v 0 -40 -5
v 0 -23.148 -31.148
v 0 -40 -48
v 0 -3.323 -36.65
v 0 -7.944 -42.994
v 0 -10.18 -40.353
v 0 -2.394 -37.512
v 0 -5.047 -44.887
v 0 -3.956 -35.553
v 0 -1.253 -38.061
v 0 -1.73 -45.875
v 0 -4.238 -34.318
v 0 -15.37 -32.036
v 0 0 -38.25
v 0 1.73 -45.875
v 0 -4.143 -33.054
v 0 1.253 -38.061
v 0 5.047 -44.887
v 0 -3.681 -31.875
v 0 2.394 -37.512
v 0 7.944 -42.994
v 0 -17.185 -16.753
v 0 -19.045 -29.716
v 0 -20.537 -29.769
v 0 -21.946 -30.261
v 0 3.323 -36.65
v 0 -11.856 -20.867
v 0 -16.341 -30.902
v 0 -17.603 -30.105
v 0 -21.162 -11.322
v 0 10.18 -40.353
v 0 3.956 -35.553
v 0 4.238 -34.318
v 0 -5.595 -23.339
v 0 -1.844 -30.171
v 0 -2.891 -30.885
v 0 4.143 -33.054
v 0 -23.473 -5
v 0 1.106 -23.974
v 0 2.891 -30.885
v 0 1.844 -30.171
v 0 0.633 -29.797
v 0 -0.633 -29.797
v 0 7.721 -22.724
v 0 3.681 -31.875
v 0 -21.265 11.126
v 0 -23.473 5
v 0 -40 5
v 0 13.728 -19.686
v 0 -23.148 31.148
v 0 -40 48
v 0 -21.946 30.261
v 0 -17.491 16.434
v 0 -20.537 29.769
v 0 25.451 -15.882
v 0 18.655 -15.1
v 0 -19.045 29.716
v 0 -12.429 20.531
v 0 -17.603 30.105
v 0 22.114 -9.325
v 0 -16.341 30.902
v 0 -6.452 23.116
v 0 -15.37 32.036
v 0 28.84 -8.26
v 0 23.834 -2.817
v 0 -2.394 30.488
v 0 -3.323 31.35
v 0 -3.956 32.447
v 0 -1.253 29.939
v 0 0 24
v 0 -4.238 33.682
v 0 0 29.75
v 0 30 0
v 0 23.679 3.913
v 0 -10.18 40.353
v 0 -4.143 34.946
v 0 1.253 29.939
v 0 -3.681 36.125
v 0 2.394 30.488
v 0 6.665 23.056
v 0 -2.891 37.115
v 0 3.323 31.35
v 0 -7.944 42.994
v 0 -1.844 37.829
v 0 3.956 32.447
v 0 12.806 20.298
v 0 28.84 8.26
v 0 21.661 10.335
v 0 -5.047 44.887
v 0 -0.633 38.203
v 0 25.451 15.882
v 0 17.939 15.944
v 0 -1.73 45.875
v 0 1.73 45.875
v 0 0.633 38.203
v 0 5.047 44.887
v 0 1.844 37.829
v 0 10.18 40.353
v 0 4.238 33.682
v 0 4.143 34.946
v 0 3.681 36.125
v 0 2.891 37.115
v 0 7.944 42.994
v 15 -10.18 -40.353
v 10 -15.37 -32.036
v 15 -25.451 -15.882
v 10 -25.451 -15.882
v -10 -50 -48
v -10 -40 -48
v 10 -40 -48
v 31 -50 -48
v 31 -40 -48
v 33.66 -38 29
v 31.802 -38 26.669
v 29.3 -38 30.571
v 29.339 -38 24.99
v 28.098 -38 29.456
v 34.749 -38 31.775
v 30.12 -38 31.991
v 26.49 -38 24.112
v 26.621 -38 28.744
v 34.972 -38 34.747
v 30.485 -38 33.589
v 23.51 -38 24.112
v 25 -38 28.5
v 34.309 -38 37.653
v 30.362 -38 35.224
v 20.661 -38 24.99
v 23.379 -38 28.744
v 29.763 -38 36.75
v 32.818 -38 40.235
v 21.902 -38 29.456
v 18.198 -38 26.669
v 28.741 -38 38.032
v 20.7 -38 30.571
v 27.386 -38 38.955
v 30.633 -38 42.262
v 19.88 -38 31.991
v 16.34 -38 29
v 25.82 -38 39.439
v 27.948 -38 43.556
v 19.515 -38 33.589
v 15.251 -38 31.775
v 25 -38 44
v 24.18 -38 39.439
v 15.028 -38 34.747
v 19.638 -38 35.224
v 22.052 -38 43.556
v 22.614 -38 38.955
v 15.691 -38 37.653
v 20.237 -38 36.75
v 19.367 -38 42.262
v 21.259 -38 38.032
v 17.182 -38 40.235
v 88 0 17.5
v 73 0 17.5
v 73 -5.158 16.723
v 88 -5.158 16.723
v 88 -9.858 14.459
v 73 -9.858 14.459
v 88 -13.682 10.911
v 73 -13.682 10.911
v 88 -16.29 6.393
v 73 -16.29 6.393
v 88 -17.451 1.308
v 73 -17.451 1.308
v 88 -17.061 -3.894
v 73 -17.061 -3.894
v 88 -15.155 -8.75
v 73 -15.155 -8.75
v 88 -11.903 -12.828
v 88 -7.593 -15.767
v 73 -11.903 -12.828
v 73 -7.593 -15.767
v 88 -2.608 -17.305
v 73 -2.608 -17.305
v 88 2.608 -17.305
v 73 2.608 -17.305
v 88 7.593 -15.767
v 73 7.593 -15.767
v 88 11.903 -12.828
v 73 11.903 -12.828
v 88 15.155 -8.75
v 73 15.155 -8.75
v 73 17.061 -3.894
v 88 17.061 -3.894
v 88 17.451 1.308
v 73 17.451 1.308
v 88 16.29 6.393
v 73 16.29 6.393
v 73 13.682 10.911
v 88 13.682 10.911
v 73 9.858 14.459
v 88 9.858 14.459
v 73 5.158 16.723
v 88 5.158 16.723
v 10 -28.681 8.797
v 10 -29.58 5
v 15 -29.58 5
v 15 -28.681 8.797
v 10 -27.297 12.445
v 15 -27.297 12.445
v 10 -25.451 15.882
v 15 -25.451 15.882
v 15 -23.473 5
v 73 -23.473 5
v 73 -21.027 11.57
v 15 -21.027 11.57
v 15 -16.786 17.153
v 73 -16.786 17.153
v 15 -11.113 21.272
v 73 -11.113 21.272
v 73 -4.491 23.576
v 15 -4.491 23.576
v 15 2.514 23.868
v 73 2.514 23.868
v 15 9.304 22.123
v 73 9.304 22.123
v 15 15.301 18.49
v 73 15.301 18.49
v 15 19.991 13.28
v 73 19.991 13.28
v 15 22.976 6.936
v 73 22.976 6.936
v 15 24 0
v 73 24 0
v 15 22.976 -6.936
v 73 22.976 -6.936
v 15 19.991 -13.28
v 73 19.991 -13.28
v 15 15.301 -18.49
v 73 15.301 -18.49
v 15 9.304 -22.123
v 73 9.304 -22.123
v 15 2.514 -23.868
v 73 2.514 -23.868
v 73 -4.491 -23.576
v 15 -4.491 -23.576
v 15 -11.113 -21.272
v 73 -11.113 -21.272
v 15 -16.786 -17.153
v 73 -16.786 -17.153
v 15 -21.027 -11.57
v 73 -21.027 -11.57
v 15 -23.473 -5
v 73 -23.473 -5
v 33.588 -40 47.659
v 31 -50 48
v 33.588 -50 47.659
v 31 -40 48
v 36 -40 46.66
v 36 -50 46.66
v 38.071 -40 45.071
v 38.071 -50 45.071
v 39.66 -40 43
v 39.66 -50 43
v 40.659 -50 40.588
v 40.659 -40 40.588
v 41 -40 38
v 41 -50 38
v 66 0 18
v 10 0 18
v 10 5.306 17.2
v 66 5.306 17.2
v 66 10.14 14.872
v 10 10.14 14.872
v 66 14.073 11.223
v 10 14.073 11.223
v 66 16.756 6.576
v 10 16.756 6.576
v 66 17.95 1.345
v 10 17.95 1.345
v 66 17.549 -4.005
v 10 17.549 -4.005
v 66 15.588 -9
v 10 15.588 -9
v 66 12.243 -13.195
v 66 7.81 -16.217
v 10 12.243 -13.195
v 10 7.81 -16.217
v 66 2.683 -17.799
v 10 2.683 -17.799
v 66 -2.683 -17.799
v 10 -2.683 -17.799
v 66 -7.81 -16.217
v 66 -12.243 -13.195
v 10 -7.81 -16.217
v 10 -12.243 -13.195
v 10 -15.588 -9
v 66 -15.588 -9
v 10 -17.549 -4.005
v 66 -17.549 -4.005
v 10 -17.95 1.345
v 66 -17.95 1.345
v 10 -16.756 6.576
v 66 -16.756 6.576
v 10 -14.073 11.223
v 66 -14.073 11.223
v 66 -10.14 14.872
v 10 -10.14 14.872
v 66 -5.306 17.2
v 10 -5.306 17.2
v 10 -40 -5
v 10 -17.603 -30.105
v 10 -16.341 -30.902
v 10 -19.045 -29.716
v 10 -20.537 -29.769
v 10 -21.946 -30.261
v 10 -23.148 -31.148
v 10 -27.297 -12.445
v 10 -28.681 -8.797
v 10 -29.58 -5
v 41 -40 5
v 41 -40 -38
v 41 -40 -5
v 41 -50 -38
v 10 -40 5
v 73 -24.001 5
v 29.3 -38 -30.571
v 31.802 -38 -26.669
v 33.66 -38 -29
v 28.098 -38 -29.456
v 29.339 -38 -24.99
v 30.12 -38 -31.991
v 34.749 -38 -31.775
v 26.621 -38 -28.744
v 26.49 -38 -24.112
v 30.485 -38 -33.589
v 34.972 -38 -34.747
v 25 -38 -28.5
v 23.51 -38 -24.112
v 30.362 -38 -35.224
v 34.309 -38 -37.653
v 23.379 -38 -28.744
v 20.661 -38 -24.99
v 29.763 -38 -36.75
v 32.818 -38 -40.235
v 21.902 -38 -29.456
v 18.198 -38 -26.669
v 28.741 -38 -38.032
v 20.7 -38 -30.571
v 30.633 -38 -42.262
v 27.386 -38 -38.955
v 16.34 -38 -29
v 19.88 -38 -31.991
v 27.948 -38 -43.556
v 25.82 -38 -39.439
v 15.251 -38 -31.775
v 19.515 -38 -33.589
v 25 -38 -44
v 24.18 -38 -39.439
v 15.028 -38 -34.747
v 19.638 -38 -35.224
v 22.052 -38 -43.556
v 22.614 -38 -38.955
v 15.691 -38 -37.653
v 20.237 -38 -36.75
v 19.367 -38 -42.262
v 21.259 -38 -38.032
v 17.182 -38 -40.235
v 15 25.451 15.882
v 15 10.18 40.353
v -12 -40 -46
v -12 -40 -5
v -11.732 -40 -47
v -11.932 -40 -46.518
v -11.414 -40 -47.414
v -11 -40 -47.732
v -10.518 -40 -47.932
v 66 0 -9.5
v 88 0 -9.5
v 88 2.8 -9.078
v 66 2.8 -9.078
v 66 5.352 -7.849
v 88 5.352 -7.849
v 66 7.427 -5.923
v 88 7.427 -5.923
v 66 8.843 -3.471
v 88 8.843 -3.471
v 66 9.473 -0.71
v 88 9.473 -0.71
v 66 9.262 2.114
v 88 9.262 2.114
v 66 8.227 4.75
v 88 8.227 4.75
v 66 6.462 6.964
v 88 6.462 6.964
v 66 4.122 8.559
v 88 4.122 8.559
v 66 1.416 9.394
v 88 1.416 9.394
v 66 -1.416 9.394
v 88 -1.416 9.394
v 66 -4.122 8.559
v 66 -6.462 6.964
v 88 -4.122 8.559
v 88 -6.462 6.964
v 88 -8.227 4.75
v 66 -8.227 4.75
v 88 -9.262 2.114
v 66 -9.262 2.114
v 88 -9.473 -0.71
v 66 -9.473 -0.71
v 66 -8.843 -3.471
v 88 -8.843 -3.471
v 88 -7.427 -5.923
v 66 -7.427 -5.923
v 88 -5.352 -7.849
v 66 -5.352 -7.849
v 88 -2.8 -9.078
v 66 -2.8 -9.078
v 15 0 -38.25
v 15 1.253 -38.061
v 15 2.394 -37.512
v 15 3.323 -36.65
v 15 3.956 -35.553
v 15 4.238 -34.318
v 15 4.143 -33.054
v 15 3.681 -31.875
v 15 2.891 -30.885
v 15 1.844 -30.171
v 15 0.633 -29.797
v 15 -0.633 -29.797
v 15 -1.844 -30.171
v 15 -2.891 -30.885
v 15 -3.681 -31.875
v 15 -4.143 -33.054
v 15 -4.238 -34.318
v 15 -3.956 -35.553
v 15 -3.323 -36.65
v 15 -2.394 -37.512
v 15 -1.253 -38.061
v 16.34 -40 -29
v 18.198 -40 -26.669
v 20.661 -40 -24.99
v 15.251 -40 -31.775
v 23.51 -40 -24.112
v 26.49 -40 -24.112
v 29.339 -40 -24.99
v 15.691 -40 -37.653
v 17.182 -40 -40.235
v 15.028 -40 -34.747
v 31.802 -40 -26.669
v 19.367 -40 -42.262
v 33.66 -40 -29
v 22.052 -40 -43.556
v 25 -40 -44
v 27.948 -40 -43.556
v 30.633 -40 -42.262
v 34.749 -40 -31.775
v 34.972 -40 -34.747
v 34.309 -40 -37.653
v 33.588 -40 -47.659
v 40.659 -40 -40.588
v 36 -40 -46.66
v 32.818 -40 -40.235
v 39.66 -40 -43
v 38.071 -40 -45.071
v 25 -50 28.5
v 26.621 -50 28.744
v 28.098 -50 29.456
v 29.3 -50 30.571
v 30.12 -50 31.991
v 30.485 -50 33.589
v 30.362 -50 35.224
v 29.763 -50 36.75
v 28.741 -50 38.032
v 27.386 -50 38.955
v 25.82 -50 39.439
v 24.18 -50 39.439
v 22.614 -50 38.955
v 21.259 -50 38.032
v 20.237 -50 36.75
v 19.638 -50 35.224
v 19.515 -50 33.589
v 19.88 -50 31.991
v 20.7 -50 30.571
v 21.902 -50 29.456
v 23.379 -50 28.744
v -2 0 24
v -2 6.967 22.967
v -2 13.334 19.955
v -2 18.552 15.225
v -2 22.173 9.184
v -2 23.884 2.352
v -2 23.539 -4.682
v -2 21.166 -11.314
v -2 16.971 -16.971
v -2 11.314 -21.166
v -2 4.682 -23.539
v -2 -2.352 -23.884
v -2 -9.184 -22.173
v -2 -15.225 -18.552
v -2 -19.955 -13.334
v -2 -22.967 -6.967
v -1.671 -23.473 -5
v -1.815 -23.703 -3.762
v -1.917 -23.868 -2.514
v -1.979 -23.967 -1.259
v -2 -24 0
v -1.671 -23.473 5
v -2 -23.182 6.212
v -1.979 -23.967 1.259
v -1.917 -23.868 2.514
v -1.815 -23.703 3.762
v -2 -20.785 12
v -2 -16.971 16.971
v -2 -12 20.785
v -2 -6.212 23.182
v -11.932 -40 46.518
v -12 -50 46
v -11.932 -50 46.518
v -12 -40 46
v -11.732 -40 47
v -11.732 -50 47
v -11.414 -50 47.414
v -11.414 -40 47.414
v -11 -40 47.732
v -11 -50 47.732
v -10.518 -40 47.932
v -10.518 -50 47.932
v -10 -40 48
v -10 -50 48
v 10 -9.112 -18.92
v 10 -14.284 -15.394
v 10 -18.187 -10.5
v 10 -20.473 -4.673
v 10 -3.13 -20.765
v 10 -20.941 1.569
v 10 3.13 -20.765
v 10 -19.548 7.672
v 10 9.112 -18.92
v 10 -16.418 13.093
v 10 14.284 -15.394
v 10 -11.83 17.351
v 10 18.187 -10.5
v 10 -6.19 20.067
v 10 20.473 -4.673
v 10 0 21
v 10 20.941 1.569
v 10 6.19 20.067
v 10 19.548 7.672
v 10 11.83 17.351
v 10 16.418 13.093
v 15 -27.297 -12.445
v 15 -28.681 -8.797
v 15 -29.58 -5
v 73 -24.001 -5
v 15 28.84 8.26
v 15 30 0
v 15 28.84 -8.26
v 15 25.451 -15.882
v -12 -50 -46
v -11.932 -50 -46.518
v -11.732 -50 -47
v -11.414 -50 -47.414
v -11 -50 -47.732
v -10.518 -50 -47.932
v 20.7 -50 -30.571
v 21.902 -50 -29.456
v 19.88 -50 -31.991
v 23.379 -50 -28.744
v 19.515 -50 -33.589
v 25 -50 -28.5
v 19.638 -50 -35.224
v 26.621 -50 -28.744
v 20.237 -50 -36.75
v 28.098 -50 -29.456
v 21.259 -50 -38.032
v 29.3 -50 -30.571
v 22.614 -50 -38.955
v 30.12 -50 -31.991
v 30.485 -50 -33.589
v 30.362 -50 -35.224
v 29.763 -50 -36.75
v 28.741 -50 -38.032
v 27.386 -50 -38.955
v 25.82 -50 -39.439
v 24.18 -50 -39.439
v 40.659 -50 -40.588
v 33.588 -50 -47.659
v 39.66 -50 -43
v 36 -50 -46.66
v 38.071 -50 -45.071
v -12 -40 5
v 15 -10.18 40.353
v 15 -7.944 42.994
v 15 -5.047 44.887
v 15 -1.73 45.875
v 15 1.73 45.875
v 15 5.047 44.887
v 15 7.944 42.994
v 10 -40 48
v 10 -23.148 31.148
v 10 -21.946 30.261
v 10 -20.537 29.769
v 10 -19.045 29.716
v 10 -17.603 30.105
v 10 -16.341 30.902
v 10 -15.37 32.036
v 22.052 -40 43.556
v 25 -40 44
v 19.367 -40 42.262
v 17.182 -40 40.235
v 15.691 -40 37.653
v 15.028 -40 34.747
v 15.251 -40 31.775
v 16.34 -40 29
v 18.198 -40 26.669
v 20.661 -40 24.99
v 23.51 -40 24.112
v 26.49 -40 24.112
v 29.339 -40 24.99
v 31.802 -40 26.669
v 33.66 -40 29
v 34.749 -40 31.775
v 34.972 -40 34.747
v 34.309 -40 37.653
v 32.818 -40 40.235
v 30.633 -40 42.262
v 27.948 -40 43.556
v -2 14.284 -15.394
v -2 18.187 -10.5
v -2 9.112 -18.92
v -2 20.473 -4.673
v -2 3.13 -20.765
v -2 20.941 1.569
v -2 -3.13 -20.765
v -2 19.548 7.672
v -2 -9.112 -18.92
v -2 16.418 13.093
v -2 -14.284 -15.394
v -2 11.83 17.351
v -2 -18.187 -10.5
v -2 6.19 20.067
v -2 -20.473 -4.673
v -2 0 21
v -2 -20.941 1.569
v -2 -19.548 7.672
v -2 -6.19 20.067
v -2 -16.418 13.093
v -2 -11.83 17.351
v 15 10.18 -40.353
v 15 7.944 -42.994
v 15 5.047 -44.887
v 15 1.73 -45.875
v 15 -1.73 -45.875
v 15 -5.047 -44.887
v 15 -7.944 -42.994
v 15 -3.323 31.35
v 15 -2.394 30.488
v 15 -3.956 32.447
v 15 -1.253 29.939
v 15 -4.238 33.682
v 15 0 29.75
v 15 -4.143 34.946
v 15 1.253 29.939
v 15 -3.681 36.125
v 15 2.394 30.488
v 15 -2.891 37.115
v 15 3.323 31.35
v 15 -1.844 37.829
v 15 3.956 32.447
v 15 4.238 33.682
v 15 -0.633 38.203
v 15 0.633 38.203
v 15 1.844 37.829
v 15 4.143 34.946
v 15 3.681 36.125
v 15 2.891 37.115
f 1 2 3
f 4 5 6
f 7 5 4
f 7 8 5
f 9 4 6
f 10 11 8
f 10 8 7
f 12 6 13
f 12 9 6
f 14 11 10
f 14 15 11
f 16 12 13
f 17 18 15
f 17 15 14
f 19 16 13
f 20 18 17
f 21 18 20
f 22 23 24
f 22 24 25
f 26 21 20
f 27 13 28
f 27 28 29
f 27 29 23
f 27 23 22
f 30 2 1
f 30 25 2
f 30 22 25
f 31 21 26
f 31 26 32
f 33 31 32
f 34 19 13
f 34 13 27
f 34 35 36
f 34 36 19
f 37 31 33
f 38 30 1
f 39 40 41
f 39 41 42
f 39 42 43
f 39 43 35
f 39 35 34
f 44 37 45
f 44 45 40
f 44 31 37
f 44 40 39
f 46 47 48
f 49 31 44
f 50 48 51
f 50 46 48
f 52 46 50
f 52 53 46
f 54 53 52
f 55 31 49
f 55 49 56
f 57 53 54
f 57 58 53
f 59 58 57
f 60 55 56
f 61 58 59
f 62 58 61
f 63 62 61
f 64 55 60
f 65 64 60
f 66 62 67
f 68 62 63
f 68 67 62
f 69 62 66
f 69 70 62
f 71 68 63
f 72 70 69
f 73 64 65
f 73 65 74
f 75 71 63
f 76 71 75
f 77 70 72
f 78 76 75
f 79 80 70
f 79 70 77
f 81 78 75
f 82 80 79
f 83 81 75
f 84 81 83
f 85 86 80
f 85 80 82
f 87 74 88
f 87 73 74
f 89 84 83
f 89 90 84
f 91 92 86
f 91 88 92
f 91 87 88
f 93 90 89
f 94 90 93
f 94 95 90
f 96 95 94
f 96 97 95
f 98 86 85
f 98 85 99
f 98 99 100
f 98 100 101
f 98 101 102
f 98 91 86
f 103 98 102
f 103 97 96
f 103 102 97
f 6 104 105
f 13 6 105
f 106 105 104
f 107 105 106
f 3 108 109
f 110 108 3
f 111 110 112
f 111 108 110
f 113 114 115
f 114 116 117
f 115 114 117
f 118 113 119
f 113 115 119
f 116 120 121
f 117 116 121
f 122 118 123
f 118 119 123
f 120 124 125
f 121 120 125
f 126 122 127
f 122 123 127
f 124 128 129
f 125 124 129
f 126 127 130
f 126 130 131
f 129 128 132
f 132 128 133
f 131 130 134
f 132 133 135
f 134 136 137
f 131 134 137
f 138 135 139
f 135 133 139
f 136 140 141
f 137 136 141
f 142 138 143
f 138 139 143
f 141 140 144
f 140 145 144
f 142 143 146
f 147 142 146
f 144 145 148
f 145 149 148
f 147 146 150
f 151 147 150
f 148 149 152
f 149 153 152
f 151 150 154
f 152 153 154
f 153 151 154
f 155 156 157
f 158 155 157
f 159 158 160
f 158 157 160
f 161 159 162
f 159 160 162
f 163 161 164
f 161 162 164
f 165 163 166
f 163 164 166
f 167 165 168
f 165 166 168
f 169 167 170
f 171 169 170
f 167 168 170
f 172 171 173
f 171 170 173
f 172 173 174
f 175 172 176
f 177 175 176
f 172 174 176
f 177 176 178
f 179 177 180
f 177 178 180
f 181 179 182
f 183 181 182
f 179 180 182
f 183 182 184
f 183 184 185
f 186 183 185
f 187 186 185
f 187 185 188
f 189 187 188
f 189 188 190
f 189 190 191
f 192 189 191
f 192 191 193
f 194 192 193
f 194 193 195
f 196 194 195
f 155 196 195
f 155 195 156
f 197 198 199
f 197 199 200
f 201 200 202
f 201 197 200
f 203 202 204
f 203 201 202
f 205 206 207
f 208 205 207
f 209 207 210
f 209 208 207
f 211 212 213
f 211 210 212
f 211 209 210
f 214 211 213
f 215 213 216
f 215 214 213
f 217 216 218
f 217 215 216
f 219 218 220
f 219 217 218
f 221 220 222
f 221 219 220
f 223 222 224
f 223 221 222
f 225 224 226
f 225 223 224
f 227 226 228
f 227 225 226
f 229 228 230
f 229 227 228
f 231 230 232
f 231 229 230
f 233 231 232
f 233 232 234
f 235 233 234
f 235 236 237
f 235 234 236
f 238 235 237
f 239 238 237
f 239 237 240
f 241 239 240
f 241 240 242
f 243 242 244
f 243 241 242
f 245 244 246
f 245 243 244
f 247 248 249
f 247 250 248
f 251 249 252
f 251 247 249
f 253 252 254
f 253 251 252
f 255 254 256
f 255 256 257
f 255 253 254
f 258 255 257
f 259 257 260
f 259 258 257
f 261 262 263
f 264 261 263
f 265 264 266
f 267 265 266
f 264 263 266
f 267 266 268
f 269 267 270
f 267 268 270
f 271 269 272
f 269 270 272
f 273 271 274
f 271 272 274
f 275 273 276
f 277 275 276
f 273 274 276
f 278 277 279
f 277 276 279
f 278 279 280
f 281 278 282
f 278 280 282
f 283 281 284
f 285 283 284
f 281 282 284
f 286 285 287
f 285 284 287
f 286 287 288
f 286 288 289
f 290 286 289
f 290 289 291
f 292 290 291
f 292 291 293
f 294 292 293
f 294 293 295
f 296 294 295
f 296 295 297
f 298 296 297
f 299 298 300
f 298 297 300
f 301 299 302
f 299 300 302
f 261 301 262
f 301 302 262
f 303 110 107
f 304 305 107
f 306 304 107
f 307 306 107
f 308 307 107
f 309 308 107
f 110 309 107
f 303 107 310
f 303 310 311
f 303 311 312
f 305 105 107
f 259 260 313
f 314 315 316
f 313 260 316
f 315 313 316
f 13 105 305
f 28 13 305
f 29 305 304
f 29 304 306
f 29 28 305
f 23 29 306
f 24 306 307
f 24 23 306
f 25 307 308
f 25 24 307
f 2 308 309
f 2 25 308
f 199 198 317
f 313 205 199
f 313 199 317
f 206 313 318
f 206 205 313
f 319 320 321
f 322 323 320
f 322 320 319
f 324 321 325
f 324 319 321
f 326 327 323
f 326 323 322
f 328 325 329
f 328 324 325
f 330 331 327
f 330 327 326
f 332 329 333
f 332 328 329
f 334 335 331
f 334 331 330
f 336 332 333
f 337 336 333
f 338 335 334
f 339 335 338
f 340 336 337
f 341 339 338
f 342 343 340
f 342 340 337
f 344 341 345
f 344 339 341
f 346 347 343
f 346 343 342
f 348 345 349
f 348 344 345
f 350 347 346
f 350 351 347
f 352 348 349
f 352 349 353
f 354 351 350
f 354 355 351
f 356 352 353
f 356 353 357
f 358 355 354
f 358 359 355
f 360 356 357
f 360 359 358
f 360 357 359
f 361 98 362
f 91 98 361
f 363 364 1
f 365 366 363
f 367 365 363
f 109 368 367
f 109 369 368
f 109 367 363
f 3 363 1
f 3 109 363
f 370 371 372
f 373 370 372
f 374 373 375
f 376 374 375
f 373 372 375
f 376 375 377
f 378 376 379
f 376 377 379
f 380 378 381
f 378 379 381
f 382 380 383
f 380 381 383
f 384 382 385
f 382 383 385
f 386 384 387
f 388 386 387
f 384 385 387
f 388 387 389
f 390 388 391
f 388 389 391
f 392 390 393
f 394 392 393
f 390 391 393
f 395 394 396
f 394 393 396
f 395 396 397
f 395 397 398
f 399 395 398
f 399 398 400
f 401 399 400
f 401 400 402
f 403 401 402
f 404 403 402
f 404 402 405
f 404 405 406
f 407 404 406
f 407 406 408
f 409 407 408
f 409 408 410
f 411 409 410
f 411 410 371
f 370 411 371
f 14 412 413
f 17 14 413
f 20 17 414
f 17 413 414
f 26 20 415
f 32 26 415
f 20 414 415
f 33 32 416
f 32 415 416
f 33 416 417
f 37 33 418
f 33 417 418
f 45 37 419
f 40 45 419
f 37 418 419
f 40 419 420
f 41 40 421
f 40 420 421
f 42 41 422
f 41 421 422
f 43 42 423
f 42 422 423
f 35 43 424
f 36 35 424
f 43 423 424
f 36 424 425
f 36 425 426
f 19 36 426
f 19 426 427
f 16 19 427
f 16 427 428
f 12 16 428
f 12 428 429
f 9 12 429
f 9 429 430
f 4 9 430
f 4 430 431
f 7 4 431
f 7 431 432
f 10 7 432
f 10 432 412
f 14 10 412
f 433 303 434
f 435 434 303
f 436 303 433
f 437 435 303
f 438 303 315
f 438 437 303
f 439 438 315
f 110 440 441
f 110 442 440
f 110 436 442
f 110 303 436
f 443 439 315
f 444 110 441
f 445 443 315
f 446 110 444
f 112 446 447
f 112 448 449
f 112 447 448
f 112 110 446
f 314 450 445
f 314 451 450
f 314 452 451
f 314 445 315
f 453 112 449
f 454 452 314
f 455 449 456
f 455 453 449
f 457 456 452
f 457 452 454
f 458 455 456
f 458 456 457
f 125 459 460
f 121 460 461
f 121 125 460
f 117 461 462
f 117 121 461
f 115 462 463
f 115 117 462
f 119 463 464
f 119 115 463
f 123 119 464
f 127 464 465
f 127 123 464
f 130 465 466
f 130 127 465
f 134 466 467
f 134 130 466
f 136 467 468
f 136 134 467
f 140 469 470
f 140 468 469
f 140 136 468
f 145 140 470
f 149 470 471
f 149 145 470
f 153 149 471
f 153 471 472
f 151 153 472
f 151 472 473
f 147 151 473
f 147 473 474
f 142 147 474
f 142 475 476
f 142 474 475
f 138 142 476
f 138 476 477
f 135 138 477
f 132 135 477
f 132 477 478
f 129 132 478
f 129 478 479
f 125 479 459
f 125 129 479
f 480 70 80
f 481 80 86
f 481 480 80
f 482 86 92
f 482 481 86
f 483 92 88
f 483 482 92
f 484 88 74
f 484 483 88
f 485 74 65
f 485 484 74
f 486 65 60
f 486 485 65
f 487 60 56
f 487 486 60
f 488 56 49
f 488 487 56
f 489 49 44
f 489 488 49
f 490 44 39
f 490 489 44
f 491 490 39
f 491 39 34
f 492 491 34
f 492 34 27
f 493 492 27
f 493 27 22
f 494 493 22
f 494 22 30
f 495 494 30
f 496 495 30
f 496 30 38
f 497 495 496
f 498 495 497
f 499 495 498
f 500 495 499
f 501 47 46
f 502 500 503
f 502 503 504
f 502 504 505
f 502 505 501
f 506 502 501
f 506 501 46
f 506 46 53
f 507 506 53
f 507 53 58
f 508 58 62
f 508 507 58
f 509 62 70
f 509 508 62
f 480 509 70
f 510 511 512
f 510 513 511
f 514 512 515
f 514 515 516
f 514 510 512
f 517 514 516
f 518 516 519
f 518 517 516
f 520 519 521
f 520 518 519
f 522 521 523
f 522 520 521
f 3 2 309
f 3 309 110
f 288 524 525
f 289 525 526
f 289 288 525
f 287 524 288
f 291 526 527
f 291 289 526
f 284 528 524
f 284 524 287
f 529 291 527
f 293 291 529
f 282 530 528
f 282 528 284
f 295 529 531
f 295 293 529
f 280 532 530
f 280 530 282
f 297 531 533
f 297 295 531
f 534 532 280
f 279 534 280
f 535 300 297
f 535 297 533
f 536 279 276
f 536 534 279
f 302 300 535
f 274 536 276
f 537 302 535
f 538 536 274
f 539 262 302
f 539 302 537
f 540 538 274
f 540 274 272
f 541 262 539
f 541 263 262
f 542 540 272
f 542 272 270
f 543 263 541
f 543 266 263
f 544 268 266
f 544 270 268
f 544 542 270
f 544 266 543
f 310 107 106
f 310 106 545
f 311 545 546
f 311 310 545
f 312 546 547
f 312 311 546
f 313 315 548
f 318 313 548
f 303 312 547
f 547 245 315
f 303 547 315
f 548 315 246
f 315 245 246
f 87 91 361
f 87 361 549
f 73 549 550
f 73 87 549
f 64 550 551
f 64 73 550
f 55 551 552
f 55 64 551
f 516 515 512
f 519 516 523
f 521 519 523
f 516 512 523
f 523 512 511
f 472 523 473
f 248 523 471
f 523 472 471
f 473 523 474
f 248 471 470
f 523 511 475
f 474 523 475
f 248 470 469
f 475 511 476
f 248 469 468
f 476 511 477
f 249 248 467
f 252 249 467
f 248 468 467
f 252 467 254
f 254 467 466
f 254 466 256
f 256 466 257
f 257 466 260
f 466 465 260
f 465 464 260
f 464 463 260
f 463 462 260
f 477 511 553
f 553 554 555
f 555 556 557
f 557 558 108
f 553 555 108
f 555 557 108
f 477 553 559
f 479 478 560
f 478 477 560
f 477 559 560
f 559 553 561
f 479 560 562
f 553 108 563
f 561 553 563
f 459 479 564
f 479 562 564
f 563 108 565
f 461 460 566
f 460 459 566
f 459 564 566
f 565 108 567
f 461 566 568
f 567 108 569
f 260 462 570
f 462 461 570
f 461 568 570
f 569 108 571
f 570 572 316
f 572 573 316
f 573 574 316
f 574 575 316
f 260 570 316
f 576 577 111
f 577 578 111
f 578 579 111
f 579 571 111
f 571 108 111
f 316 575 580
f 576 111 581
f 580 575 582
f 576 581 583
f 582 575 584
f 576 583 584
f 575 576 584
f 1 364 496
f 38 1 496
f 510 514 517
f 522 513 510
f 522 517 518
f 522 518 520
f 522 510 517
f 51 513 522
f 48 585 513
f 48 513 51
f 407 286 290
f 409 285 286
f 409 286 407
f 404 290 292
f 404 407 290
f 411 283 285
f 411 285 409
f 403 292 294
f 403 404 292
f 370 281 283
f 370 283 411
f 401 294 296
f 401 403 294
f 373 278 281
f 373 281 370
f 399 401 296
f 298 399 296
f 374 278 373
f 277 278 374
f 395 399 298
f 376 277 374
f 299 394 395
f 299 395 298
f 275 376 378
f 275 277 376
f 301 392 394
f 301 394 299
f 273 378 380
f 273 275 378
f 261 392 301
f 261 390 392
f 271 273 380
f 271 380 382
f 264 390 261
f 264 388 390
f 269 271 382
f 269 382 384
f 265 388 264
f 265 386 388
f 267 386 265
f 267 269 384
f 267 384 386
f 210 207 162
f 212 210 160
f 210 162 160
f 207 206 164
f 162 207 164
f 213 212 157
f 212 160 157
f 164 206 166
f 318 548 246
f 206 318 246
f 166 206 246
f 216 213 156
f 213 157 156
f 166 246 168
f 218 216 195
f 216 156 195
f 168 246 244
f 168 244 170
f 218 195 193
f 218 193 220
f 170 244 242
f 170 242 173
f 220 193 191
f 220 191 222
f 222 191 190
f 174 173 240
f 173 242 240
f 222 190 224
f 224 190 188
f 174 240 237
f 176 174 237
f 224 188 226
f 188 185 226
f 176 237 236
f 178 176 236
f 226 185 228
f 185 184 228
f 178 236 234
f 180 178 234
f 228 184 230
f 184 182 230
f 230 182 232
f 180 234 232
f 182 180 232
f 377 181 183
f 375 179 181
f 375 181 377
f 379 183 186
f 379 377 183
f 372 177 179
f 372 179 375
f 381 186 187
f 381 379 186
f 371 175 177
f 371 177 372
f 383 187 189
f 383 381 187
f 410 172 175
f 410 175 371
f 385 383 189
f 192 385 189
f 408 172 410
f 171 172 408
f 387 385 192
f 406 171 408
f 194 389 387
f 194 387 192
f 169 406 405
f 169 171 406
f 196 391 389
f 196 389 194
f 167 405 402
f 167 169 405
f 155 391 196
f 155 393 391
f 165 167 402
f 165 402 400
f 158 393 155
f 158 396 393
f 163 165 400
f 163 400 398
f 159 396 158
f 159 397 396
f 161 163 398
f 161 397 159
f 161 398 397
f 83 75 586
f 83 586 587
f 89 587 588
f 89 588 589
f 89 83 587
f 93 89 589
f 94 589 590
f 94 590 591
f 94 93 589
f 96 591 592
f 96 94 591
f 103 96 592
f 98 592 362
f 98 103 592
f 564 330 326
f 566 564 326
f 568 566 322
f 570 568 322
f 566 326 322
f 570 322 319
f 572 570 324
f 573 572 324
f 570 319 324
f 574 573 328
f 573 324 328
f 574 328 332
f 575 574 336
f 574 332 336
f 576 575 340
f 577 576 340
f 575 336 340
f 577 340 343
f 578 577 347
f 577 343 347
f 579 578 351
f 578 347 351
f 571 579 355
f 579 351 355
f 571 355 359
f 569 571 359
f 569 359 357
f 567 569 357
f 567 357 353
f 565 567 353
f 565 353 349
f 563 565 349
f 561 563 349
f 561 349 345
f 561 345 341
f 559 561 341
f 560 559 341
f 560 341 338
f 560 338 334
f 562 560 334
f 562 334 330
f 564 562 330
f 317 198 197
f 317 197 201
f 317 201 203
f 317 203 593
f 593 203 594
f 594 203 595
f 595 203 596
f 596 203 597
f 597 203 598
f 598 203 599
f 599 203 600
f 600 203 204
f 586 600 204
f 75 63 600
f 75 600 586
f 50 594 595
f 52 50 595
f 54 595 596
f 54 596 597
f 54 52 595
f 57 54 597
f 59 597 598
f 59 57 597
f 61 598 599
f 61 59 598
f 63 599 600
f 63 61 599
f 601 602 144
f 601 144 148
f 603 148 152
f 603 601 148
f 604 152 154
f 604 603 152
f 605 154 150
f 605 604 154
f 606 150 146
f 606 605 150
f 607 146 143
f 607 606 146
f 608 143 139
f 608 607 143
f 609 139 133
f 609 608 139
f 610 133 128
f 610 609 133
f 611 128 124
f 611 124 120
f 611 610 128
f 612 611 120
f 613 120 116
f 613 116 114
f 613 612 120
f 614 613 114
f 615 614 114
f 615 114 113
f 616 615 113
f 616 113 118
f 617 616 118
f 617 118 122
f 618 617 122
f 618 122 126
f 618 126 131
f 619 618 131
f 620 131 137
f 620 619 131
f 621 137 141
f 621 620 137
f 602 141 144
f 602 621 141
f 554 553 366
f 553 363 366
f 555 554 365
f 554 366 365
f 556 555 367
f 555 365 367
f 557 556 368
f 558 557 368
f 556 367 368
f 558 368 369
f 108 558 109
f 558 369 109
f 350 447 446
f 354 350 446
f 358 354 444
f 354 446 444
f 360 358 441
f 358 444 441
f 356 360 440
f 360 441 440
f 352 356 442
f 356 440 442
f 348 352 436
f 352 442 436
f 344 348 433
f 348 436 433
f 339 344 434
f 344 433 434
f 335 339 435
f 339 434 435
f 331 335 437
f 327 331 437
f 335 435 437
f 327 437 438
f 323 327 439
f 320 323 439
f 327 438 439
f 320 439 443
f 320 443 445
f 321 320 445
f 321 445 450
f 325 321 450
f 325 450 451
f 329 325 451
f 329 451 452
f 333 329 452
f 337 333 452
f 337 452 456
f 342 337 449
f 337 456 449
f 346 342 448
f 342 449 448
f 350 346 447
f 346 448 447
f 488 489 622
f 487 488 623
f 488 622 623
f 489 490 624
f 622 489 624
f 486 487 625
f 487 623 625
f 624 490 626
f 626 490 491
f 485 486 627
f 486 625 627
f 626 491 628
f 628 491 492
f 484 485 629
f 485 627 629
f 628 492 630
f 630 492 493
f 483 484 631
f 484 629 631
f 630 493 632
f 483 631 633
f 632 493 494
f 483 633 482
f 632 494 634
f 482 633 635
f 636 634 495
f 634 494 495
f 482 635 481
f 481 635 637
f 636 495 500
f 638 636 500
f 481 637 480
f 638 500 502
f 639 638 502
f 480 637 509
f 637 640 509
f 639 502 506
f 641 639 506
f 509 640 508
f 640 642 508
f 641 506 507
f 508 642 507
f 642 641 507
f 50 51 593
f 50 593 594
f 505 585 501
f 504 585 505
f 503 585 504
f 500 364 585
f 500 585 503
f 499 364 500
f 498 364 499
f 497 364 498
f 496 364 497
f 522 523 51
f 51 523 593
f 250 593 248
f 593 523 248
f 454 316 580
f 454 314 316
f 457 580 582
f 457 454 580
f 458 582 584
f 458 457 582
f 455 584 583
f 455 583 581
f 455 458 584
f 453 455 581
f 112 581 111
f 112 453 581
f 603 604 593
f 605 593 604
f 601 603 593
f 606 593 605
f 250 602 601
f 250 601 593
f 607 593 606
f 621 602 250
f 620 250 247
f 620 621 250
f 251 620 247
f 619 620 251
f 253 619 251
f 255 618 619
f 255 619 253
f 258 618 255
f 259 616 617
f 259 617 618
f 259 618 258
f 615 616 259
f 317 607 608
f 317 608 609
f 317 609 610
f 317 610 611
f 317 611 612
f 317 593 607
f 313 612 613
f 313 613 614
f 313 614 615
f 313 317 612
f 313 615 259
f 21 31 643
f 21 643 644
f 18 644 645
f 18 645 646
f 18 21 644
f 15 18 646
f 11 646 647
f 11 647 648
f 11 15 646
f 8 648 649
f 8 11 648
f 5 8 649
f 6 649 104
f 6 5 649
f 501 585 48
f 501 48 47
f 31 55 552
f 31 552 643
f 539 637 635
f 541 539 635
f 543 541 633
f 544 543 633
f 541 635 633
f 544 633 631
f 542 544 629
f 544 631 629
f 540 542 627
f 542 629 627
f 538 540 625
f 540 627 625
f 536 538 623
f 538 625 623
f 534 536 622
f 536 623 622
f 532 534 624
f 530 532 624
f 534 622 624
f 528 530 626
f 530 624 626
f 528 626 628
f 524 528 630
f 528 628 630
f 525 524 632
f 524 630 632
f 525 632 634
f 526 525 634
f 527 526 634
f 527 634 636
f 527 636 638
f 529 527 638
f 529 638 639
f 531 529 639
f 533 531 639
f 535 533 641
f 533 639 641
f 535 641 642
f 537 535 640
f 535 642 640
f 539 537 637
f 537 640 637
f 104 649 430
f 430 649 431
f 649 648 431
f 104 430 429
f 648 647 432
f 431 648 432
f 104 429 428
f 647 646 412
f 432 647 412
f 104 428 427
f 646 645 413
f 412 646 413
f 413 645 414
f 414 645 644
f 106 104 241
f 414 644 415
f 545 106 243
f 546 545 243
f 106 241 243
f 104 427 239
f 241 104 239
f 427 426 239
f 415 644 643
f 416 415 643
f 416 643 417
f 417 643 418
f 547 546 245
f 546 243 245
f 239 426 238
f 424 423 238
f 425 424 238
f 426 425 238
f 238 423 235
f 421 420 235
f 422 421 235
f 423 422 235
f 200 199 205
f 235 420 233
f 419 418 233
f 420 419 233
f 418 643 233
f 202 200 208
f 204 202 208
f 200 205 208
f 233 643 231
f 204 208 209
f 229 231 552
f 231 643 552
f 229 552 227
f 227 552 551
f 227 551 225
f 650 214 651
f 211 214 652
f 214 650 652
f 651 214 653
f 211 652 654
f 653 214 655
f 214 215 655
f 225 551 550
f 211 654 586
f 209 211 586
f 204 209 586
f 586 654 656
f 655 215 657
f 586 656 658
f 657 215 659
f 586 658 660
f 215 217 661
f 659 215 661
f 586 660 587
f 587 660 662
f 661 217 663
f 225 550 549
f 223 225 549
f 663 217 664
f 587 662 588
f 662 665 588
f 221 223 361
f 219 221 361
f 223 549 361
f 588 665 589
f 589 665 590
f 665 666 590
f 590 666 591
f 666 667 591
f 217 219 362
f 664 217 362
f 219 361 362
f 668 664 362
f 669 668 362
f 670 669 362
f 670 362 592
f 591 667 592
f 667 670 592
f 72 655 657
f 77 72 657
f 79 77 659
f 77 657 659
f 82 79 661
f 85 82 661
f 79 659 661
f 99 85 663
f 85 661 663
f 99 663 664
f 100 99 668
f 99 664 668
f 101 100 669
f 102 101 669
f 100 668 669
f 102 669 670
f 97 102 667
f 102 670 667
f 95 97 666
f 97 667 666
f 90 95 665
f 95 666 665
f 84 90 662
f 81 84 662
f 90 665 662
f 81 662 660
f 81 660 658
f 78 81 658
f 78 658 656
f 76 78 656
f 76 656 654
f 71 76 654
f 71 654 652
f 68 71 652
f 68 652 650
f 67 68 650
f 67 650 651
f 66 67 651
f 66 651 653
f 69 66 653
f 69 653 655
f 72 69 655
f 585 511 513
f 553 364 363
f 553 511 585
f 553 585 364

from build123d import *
from OCP.BRepFilletAPI import BRepFilletAPI_MakeFillet

# Parameters (mm, degrees)
EXTRUDE_1_DEPTH      = 15
EXTRUDE_START        = 2
SKETCH_2_R           = 24
EXTRUDE_2_DEPTH      = 75
EXTRUDE_START_2      = -75
SKETCH_3_R           = 17.5
EXTRUDE_3_DEPTH      = 90
SKETCH_4_W           = 53
SKETCH_4_H           = 96
EXTRUDE_4_DEPTH      = 10
FILLET_1_R1          = 2
FILLET_1_R2          = 10
SKETCH_5_R           = 10
EXTRUDE_5_DEPTH      = 2
SKETCH_6_R           = 5.5
CUT_EXTRUDE_1_DEPTH  = 122.128031438
EXTRUDE_6_DEPTH      = 10
RIB_1_REACH          = 114.018
SKETCH_8_WALL_W      = 244.903673704
SKETCH_8_WALL_H      = 10
SKETCH_12_R          = 21
CUT_EXTRUDE_3_DEPTH  = 12
SKETCH_13_R          = 18
CUT_EXTRUDE_4_DEPTH  = 56
HOLE_WIZARD_G1_2_1_D = 19
HOLE_WIZARD_M10_1_D  = 8.5
RIB_START            = -5
RIB_13_DEPTH         = 10


with BuildPart() as part:
    # 草图1 → 凸台-拉伸1 (new body)
    with BuildSketch(Plane(origin=(0, 0, 0), x_dir=(0, 0, -1), z_dir=(1, 0, 0))):
        with BuildLine():
            Line((15.882352941, 25.45095018), (40.352941176, 10.180380072))
            ThreePointArc((40.352941176, 10.180380072), (46, 0), (40.352941176, -10.180380072))
            Line((40.352941176, -10.180380072), (15.882352941, -25.45095018))
            ThreePointArc((15.882352941, -25.45095018), (0, -30), (-15.882352941, -25.45095018))
            Line((-15.882352941, -25.45095018), (-40.352941176, -10.180380072))
            ThreePointArc((-40.352941176, -10.180380072), (-46, 0), (-40.352941176, 10.180380072))
            Line((-40.352941176, 10.180380072), (-15.882352941, 25.45095018))
            ThreePointArc((-15.882352941, 25.45095018), (0, 30), (15.882352941, 25.45095018))
        make_face()
    extrude(amount=EXTRUDE_1_DEPTH)

    # 草图2 → 凸台-拉伸2 (add)
    with BuildSketch(Plane.ZY.offset(EXTRUDE_START)):
        Circle(SKETCH_2_R)
    extrude(amount=-EXTRUDE_2_DEPTH)

    # 草图3 → 凸台-拉伸3 (add)
    with BuildSketch(Plane(origin=(73, 0, 0), x_dir=(0, 0, -1), z_dir=(1, 0, 0)).offset(EXTRUDE_START_2)):
        with Locations(Location((0, 0, 0), (0, 0, 180))):
            Circle(SKETCH_3_R)
    extrude(amount=EXTRUDE_3_DEPTH)



with BuildPart() as body_2:
    # 草图4 → 凸台-拉伸4 (new body)
    with BuildSketch(Plane(origin=(0, -50, 0), x_dir=(1, 0, 0), z_dir=(0, 1, 0))):
        with Locations((14.5, 0)):
            Rectangle(SKETCH_4_W, SKETCH_4_H)
    extrude(amount=EXTRUDE_4_DEPTH)

    # 圆角1: one fillet with a radius per group of edges: ONE call of the kernel's fillet builder (fillet() takes one radius for all edges)
    fillet_1_edges_1 = [body_2.edges().sort_by_distance(p)[0] for p in [
        (-12, -45, 48),
        (-12, -45, -48),
    ]]
    fillet_1_edges_2 = [body_2.edges().sort_by_distance(p)[0] for p in [
        (41, -45, -48),
        (41, -45, 48),
    ]]
    fillet_1 = BRepFilletAPI_MakeFillet(body_2.part.solid().wrapped)
    for e in fillet_1_edges_1:
        fillet_1.Add(FILLET_1_R1, e.wrapped)
    for e in fillet_1_edges_2:
        fillet_1.Add(FILLET_1_R2, e.wrapped)
    add(Compound.cast(fillet_1.Shape()), mode=Mode.REPLACE)

    # 草图5 → 凸台-拉伸5 (add)
    with BuildSketch(Plane(origin=(0, -40, 0), x_dir=(1, 0, 0), z_dir=(0, 1, 0))):
        with Locations(Location((25, 34, 0), (0, 0, 90))):
            Circle(SKETCH_5_R)
    extrude_5 = extrude(amount=EXTRUDE_5_DEPTH)

    # 草图6 → 切除-拉伸1 (cut, through all)
    with BuildSketch(Plane(origin=(0, -38, 0), x_dir=(1, 0, 0), z_dir=(0, 1, 0))):
        with Locations(Location((25, 34, 0), (0, 0, 270))):
            Circle(SKETCH_6_R)
    cut_extrude_1 = extrude(amount=-CUT_EXTRUDE_1_DEPTH, mode=Mode.SUBTRACT)

    # 镜向1: 凸台-拉伸5, 切除-拉伸1 across plane
    add(extrude_5.mirror(Plane.XY))
    add(cut_extrude_1.mirror(Plane.XY), mode=Mode.SUBTRACT)


with BuildPart() as part_1:
    add(part.part)

    add(body_2.part)  # 凸台-拉伸6 merges body 2
    # 草图7 → 凸台-拉伸6 (add)
    with BuildSketch(Plane.ZY):
        with BuildLine():
            Line((48, -40), (31.147709092, -23.147709092))
            ThreePointArc((31.147709092, -23.147709092), (29.715553271, -19.044672956), (32.036184174, -15.370350156))
            Line((32.036184174, -15.370350156), (15.882352941, -25.45095018))
            ThreePointArc((15.882352941, -25.45095018), (0, -30), (-15.882352941, -25.45095018))
            Line((-15.882352941, -25.45095018), (-32.036184174, -15.370350156))
            ThreePointArc((-32.036184174, -15.370350156), (-29.715553271, -19.044672956), (-31.147709092, -23.147709092))
            Line((-31.147709092, -23.147709092), (-48, -40))
            Line((-48, -40), (-46, -40))
            Line((-46, -40), (46, -40))
            Line((46, -40), (48, -40))
        make_face()
    extrude(amount=-EXTRUDE_6_DEPTH)

    # 草图8 wall → 筋1 (add, up to next)
    with BuildSketch(Plane(origin=(-7, -32, 0), x_dir=(0.529998940003, 0.847998304005, 0), z_dir=(-0.847998304005, 0.529998940003, 0)), mode=Mode.PRIVATE) as rib_1_sk1:
        Rectangle(SKETCH_8_WALL_W, SKETCH_8_WALL_H)
    rib_1_tool1 = extrude(rib_1_sk1.sketch, amount=-RIB_1_REACH, mode=Mode.PRIVATE) - part_1.part
    add(rib_1_tool1.solids().sort_by_distance((-7, -32, 0))[0])

    # 草图12 → 切除-拉伸3 (cut)
    with BuildSketch(Plane.ZY.offset(2)):
        Circle(SKETCH_12_R)
    extrude(amount=-CUT_EXTRUDE_3_DEPTH, mode=Mode.SUBTRACT)

    # 草图13 → 切除-拉伸4 (cut)
    with BuildSketch(Plane.ZY.offset(-10)):
        Circle(SKETCH_13_R)
    extrude(amount=-CUT_EXTRUDE_4_DEPTH, mode=Mode.SUBTRACT)

    # G1/2 螺纹孔1 (through all)
    with Locations(Plane.ZY.offset(-66)):
        with Locations((0, 0)):
            Hole(HOLE_WIZARD_G1_2_1_D / 2)

    # M10 螺纹孔1 (through all)
    with Locations(Plane.ZY):
        with Locations((34, 0), (-34, 0)):
            Hole(HOLE_WIZARD_M10_1_D / 2)

    # 筋13: read off the stored shape, not the designer's step
    # 筋13 outline → 筋13 (add)
    with BuildSketch(Plane.XY.offset(RIB_START)):
        Polygon((41, -40), (73, -24.001), (73, -23.473389189), (15, -23.473389189), (15, -29.580398915), (10, -29.580398915), (10, -40), align=None)
    extrude(amount=RIB_13_DEPTH)


solid = part_1.part
